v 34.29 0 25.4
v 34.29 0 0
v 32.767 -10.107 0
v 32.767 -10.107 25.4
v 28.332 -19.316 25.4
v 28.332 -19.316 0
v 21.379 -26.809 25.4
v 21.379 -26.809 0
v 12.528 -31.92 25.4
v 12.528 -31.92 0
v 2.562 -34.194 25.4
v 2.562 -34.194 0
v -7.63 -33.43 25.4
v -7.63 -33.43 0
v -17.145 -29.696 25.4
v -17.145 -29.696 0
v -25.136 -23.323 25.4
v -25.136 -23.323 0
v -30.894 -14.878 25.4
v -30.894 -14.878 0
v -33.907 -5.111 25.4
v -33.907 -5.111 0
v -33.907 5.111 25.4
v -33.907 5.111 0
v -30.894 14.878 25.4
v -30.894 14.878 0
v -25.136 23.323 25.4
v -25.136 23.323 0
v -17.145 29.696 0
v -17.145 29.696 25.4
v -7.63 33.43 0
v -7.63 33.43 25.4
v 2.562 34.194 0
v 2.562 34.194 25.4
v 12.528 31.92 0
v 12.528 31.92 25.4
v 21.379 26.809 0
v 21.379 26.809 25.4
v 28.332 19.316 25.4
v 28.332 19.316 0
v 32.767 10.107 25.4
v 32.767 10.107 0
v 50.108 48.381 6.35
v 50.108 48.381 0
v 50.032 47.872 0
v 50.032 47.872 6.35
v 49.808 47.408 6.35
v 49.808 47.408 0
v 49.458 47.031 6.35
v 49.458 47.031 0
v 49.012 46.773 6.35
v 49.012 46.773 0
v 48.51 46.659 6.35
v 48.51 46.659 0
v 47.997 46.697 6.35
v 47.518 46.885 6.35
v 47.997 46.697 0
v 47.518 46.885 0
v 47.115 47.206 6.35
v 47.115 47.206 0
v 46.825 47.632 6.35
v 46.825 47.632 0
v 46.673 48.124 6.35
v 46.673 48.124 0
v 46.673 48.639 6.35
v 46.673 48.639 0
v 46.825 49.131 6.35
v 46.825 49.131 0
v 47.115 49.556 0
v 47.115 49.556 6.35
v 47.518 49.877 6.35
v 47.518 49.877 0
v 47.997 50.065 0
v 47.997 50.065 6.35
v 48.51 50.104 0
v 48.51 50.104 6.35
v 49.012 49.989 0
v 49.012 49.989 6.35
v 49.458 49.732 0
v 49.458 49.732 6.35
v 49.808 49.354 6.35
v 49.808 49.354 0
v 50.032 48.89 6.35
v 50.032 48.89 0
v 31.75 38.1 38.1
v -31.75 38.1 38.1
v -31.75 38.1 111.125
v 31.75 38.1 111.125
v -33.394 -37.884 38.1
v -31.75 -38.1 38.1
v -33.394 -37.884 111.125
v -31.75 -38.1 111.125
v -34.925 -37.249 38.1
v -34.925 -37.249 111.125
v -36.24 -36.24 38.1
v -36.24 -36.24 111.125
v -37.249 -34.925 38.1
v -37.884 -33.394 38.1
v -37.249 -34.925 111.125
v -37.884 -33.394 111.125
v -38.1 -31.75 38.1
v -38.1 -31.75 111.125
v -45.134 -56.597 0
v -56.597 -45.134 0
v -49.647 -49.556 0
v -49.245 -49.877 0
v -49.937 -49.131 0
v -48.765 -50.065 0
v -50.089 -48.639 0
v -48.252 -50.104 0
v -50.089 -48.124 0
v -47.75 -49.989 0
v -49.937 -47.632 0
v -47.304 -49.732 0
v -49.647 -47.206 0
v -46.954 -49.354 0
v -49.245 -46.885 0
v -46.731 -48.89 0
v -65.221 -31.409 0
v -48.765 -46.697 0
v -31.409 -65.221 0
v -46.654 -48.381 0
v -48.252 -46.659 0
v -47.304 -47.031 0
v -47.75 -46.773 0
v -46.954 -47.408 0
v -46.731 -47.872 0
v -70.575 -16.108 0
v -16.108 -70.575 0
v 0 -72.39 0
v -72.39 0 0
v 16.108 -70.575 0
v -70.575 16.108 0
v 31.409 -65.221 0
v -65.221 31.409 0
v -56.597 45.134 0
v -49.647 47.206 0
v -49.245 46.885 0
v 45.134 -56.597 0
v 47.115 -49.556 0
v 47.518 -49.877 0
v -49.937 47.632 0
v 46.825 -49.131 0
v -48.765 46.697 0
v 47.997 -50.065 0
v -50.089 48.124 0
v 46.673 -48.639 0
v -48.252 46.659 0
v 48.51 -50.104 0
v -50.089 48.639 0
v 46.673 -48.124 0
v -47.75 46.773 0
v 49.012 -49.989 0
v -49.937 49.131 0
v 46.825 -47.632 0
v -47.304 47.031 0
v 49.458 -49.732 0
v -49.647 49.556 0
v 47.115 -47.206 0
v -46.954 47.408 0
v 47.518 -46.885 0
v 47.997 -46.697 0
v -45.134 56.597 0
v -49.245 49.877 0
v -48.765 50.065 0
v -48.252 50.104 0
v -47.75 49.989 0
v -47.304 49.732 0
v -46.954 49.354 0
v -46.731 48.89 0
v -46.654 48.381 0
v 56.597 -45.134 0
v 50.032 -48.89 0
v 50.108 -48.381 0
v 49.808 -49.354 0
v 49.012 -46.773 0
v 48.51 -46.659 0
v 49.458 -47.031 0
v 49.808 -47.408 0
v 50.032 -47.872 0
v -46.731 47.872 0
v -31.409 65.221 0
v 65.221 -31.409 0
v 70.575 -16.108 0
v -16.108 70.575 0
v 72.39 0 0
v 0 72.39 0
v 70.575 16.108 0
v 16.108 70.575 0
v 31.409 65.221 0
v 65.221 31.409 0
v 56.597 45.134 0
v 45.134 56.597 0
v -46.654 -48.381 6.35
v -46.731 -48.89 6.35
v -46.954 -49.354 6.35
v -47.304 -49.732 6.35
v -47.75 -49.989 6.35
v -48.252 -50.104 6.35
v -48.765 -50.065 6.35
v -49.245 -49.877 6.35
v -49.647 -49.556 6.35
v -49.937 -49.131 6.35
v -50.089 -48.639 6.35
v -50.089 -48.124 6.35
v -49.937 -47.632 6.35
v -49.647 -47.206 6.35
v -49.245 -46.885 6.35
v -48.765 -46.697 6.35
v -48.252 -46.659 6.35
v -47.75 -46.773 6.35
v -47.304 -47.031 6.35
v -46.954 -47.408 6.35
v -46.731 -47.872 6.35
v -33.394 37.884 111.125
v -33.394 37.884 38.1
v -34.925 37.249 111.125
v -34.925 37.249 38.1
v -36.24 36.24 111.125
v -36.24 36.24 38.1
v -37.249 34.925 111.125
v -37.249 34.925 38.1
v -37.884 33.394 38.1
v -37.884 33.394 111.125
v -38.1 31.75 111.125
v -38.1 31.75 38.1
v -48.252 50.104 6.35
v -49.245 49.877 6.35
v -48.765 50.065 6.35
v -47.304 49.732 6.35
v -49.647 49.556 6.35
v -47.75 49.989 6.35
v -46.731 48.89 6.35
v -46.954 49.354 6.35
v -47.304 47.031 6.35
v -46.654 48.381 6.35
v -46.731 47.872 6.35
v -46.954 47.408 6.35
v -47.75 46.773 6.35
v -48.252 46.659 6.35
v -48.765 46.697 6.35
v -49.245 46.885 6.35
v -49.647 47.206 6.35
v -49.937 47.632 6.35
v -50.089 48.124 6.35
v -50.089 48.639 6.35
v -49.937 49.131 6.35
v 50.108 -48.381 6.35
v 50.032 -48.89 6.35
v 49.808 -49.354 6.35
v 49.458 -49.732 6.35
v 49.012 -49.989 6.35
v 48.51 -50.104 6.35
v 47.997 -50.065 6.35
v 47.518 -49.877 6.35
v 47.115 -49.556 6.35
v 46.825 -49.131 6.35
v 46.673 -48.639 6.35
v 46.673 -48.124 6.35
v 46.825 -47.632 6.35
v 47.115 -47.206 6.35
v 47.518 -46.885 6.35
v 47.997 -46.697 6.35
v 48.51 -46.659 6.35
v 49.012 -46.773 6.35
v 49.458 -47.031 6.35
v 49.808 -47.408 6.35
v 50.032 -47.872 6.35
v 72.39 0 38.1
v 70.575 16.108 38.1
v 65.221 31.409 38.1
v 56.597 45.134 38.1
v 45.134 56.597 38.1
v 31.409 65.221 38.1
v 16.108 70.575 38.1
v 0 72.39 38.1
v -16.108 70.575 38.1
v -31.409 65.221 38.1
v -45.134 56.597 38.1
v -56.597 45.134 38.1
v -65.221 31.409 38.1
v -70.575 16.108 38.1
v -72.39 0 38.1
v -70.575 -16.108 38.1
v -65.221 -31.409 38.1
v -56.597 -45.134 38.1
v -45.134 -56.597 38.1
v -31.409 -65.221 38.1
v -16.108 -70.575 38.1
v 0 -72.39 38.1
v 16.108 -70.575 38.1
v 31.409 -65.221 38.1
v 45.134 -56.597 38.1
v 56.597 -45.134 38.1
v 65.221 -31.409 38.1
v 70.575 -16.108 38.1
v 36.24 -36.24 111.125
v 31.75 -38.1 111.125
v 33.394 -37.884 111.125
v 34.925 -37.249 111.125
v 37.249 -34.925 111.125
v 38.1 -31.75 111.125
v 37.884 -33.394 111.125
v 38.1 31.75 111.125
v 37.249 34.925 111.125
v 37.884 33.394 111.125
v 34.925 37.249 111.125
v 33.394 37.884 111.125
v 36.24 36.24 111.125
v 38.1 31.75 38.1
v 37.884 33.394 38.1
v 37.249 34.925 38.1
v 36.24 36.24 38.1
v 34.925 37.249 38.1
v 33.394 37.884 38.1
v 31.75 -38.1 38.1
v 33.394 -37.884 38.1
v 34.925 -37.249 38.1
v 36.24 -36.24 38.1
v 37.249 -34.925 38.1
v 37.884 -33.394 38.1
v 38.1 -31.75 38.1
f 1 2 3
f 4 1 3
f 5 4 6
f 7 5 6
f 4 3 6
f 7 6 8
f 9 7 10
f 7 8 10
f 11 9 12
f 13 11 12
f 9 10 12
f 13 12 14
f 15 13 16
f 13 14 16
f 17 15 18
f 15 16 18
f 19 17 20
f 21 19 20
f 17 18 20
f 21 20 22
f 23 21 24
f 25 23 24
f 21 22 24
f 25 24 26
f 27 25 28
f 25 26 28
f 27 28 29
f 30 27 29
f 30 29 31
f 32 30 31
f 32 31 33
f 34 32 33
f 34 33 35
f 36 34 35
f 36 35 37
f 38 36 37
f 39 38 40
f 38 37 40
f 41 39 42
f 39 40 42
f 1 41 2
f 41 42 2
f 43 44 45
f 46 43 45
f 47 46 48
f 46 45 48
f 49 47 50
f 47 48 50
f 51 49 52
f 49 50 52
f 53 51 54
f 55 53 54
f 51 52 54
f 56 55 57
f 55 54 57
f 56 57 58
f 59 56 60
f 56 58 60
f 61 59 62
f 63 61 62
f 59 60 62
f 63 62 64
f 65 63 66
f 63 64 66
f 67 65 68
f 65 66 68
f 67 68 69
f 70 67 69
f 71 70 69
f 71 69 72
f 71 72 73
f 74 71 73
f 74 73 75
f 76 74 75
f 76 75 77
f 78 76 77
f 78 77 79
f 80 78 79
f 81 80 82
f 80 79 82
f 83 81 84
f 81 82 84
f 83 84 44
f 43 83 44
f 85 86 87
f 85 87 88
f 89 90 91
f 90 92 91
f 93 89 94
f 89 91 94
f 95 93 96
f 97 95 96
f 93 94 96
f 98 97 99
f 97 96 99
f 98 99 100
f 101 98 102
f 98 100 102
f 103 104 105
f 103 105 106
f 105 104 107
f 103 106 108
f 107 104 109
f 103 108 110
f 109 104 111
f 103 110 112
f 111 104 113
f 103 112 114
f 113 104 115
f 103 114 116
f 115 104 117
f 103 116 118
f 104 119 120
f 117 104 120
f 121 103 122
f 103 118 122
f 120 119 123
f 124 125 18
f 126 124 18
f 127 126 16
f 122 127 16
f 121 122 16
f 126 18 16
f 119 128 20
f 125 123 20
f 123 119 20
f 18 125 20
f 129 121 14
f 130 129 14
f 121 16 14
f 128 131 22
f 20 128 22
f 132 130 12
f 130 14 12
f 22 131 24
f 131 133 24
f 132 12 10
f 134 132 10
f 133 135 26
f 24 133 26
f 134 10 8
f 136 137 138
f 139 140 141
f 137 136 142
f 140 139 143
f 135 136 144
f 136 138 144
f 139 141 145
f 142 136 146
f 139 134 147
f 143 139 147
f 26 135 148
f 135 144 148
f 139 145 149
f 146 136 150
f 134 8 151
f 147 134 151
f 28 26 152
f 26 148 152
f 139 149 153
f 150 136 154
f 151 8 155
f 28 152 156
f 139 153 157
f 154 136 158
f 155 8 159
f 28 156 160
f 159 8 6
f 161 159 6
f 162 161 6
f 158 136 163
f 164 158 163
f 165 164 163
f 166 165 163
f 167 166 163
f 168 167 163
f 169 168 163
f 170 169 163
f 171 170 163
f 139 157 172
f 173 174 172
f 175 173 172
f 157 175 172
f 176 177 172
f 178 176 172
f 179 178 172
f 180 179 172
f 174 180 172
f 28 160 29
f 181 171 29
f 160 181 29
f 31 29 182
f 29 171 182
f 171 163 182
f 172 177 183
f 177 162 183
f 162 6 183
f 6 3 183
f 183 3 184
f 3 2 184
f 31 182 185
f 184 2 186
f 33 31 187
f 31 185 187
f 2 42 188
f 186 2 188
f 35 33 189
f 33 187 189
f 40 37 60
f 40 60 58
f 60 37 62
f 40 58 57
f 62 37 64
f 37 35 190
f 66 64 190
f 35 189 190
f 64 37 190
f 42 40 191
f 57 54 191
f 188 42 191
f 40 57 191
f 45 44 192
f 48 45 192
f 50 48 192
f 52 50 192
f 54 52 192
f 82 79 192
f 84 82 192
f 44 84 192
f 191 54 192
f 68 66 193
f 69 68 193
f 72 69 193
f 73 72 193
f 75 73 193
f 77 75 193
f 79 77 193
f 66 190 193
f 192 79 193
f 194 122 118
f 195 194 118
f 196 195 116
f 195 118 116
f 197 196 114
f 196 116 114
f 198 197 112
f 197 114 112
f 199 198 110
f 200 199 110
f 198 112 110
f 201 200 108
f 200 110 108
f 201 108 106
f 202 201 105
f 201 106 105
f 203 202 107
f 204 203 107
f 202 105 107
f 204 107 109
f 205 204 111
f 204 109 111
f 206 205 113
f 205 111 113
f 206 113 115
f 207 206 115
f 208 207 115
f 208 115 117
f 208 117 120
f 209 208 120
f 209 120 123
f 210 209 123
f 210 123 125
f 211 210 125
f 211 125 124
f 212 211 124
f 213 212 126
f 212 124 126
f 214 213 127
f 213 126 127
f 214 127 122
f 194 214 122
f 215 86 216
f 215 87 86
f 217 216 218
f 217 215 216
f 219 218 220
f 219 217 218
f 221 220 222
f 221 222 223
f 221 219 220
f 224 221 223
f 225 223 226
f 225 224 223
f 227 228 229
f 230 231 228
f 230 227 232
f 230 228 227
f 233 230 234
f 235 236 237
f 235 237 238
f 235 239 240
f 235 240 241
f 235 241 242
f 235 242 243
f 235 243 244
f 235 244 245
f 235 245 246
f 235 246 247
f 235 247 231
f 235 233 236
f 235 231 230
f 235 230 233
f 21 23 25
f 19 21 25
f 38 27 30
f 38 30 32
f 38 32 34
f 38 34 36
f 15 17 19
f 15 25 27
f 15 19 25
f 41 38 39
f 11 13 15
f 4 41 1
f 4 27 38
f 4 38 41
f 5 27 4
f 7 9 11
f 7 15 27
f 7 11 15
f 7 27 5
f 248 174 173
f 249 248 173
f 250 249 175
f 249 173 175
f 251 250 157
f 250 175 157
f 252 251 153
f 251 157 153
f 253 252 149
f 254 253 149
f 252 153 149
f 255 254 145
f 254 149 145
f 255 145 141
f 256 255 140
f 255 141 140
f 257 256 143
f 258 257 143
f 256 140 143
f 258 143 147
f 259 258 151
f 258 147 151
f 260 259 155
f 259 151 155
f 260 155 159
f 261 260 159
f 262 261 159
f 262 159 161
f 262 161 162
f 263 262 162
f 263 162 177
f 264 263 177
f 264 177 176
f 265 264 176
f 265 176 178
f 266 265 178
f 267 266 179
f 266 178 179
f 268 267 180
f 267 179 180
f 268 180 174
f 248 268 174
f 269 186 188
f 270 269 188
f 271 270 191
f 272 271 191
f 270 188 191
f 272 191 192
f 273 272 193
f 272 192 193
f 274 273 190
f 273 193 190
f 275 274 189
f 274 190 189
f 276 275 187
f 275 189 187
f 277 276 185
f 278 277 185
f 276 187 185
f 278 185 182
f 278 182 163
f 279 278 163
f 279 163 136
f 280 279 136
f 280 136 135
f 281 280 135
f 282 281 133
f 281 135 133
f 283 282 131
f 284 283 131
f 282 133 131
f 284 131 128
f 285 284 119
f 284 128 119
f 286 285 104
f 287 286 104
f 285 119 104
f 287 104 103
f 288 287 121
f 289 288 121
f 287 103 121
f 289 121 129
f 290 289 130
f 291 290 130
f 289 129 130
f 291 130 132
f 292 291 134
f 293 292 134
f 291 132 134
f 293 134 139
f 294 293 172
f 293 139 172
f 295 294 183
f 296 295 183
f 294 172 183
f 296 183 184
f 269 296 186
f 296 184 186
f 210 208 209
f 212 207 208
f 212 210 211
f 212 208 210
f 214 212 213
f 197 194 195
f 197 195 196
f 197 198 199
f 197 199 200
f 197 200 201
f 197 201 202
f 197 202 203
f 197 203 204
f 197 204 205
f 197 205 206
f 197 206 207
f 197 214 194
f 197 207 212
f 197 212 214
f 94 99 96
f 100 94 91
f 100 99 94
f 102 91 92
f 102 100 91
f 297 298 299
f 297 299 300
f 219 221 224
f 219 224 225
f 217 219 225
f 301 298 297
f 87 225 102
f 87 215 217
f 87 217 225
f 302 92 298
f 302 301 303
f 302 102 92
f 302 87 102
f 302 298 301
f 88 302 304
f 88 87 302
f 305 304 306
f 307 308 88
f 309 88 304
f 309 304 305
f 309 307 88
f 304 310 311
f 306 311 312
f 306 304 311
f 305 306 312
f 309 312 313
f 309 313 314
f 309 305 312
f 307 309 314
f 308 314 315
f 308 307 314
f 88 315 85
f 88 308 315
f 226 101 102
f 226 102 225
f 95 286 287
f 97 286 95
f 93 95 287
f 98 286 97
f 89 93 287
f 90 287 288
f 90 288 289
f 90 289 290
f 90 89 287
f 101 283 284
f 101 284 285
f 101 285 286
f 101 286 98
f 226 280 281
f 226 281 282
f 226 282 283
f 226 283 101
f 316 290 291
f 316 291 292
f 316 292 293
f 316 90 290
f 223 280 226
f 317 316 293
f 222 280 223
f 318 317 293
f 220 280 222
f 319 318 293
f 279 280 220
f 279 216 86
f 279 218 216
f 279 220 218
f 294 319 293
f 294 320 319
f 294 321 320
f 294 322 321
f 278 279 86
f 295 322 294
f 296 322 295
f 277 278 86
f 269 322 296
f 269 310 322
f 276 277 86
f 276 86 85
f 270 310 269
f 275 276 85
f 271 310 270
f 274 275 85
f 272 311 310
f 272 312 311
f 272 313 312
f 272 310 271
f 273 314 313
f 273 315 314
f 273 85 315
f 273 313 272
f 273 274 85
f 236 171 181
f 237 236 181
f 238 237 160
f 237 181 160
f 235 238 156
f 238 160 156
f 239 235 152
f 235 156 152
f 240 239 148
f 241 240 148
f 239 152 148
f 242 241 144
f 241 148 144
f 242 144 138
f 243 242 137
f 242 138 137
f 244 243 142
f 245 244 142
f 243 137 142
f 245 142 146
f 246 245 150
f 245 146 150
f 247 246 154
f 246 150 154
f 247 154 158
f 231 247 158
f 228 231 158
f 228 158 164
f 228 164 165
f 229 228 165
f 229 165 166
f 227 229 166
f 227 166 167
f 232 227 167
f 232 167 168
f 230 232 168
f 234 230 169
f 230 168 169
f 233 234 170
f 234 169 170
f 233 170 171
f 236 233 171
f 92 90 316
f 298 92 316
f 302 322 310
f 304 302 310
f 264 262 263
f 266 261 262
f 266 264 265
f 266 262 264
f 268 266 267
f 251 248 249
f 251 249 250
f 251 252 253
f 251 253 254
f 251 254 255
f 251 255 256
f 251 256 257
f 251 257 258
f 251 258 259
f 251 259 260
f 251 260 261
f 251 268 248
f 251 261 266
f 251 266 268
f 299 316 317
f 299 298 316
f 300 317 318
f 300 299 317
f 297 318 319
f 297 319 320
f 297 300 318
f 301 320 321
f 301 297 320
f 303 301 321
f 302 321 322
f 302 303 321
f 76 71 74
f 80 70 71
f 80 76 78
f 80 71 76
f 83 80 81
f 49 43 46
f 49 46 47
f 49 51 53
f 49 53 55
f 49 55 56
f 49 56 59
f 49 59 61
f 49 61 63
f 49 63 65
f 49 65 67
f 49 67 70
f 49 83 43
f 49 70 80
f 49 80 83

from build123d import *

# Parameters (mm, degrees)
F0_R     = 72.39
F1_DEPTH = 38.1
F2_W     = 76.2
F2_H     = 76.2
F3_DEPTH = 73.025
F4_R     = 6.35
F5_R     = 1.7272
F6_DEPTH = 6.35
F7_R     = 34.29
F8_DEPTH = 25.4


with BuildPart() as f1:
    # F0 (on Top) → F1 (new body)
    with BuildSketch(Plane.XY):
        Circle(F0_R)
    extrude(amount=F1_DEPTH)

    # F2 (on face) → F3 (join)
    with BuildSketch(Plane.XY.offset(38.1)):
        Rectangle(F2_W, F2_H)
    extrude(amount=F3_DEPTH)

    # F4
    f4_edges = [f1.edges().sort_by_distance(p)[0] for p in [
        (-38.1, -38.1, 74.6125),
        (-38.1, 38.1, 74.6125),
        (38.1, -38.1, 74.6125),
        (38.1, 38.1, 74.6125),
    ]]
    fillet(f4_edges, radius=F4_R)

    # F5 (on face) → F6 (cut)
    with BuildSketch(Plane(origin=(0, 0, 0), x_dir=(1, 0, 0), z_dir=(0, 0, -1))):
        with Locations((-48.38113, 48.38113)):
            Circle(F5_R)
        with Locations((-48.38113, -48.38113)):
            Circle(F5_R)
        with Locations((48.38113, -48.38113)):
            Circle(F5_R)
        with Locations((48.38113, 48.38113)):
            Circle(F5_R)
    extrude(amount=-F6_DEPTH, mode=Mode.SUBTRACT)

    # F7 (on face) → F8 (cut)
    with BuildSketch(Plane(origin=(0, 0, 0), x_dir=(1, 0, 0), z_dir=(0, 0, -1))):
        Circle(F7_R)
    extrude(amount=-F8_DEPTH, mode=Mode.SUBTRACT)


solid = f1.part
